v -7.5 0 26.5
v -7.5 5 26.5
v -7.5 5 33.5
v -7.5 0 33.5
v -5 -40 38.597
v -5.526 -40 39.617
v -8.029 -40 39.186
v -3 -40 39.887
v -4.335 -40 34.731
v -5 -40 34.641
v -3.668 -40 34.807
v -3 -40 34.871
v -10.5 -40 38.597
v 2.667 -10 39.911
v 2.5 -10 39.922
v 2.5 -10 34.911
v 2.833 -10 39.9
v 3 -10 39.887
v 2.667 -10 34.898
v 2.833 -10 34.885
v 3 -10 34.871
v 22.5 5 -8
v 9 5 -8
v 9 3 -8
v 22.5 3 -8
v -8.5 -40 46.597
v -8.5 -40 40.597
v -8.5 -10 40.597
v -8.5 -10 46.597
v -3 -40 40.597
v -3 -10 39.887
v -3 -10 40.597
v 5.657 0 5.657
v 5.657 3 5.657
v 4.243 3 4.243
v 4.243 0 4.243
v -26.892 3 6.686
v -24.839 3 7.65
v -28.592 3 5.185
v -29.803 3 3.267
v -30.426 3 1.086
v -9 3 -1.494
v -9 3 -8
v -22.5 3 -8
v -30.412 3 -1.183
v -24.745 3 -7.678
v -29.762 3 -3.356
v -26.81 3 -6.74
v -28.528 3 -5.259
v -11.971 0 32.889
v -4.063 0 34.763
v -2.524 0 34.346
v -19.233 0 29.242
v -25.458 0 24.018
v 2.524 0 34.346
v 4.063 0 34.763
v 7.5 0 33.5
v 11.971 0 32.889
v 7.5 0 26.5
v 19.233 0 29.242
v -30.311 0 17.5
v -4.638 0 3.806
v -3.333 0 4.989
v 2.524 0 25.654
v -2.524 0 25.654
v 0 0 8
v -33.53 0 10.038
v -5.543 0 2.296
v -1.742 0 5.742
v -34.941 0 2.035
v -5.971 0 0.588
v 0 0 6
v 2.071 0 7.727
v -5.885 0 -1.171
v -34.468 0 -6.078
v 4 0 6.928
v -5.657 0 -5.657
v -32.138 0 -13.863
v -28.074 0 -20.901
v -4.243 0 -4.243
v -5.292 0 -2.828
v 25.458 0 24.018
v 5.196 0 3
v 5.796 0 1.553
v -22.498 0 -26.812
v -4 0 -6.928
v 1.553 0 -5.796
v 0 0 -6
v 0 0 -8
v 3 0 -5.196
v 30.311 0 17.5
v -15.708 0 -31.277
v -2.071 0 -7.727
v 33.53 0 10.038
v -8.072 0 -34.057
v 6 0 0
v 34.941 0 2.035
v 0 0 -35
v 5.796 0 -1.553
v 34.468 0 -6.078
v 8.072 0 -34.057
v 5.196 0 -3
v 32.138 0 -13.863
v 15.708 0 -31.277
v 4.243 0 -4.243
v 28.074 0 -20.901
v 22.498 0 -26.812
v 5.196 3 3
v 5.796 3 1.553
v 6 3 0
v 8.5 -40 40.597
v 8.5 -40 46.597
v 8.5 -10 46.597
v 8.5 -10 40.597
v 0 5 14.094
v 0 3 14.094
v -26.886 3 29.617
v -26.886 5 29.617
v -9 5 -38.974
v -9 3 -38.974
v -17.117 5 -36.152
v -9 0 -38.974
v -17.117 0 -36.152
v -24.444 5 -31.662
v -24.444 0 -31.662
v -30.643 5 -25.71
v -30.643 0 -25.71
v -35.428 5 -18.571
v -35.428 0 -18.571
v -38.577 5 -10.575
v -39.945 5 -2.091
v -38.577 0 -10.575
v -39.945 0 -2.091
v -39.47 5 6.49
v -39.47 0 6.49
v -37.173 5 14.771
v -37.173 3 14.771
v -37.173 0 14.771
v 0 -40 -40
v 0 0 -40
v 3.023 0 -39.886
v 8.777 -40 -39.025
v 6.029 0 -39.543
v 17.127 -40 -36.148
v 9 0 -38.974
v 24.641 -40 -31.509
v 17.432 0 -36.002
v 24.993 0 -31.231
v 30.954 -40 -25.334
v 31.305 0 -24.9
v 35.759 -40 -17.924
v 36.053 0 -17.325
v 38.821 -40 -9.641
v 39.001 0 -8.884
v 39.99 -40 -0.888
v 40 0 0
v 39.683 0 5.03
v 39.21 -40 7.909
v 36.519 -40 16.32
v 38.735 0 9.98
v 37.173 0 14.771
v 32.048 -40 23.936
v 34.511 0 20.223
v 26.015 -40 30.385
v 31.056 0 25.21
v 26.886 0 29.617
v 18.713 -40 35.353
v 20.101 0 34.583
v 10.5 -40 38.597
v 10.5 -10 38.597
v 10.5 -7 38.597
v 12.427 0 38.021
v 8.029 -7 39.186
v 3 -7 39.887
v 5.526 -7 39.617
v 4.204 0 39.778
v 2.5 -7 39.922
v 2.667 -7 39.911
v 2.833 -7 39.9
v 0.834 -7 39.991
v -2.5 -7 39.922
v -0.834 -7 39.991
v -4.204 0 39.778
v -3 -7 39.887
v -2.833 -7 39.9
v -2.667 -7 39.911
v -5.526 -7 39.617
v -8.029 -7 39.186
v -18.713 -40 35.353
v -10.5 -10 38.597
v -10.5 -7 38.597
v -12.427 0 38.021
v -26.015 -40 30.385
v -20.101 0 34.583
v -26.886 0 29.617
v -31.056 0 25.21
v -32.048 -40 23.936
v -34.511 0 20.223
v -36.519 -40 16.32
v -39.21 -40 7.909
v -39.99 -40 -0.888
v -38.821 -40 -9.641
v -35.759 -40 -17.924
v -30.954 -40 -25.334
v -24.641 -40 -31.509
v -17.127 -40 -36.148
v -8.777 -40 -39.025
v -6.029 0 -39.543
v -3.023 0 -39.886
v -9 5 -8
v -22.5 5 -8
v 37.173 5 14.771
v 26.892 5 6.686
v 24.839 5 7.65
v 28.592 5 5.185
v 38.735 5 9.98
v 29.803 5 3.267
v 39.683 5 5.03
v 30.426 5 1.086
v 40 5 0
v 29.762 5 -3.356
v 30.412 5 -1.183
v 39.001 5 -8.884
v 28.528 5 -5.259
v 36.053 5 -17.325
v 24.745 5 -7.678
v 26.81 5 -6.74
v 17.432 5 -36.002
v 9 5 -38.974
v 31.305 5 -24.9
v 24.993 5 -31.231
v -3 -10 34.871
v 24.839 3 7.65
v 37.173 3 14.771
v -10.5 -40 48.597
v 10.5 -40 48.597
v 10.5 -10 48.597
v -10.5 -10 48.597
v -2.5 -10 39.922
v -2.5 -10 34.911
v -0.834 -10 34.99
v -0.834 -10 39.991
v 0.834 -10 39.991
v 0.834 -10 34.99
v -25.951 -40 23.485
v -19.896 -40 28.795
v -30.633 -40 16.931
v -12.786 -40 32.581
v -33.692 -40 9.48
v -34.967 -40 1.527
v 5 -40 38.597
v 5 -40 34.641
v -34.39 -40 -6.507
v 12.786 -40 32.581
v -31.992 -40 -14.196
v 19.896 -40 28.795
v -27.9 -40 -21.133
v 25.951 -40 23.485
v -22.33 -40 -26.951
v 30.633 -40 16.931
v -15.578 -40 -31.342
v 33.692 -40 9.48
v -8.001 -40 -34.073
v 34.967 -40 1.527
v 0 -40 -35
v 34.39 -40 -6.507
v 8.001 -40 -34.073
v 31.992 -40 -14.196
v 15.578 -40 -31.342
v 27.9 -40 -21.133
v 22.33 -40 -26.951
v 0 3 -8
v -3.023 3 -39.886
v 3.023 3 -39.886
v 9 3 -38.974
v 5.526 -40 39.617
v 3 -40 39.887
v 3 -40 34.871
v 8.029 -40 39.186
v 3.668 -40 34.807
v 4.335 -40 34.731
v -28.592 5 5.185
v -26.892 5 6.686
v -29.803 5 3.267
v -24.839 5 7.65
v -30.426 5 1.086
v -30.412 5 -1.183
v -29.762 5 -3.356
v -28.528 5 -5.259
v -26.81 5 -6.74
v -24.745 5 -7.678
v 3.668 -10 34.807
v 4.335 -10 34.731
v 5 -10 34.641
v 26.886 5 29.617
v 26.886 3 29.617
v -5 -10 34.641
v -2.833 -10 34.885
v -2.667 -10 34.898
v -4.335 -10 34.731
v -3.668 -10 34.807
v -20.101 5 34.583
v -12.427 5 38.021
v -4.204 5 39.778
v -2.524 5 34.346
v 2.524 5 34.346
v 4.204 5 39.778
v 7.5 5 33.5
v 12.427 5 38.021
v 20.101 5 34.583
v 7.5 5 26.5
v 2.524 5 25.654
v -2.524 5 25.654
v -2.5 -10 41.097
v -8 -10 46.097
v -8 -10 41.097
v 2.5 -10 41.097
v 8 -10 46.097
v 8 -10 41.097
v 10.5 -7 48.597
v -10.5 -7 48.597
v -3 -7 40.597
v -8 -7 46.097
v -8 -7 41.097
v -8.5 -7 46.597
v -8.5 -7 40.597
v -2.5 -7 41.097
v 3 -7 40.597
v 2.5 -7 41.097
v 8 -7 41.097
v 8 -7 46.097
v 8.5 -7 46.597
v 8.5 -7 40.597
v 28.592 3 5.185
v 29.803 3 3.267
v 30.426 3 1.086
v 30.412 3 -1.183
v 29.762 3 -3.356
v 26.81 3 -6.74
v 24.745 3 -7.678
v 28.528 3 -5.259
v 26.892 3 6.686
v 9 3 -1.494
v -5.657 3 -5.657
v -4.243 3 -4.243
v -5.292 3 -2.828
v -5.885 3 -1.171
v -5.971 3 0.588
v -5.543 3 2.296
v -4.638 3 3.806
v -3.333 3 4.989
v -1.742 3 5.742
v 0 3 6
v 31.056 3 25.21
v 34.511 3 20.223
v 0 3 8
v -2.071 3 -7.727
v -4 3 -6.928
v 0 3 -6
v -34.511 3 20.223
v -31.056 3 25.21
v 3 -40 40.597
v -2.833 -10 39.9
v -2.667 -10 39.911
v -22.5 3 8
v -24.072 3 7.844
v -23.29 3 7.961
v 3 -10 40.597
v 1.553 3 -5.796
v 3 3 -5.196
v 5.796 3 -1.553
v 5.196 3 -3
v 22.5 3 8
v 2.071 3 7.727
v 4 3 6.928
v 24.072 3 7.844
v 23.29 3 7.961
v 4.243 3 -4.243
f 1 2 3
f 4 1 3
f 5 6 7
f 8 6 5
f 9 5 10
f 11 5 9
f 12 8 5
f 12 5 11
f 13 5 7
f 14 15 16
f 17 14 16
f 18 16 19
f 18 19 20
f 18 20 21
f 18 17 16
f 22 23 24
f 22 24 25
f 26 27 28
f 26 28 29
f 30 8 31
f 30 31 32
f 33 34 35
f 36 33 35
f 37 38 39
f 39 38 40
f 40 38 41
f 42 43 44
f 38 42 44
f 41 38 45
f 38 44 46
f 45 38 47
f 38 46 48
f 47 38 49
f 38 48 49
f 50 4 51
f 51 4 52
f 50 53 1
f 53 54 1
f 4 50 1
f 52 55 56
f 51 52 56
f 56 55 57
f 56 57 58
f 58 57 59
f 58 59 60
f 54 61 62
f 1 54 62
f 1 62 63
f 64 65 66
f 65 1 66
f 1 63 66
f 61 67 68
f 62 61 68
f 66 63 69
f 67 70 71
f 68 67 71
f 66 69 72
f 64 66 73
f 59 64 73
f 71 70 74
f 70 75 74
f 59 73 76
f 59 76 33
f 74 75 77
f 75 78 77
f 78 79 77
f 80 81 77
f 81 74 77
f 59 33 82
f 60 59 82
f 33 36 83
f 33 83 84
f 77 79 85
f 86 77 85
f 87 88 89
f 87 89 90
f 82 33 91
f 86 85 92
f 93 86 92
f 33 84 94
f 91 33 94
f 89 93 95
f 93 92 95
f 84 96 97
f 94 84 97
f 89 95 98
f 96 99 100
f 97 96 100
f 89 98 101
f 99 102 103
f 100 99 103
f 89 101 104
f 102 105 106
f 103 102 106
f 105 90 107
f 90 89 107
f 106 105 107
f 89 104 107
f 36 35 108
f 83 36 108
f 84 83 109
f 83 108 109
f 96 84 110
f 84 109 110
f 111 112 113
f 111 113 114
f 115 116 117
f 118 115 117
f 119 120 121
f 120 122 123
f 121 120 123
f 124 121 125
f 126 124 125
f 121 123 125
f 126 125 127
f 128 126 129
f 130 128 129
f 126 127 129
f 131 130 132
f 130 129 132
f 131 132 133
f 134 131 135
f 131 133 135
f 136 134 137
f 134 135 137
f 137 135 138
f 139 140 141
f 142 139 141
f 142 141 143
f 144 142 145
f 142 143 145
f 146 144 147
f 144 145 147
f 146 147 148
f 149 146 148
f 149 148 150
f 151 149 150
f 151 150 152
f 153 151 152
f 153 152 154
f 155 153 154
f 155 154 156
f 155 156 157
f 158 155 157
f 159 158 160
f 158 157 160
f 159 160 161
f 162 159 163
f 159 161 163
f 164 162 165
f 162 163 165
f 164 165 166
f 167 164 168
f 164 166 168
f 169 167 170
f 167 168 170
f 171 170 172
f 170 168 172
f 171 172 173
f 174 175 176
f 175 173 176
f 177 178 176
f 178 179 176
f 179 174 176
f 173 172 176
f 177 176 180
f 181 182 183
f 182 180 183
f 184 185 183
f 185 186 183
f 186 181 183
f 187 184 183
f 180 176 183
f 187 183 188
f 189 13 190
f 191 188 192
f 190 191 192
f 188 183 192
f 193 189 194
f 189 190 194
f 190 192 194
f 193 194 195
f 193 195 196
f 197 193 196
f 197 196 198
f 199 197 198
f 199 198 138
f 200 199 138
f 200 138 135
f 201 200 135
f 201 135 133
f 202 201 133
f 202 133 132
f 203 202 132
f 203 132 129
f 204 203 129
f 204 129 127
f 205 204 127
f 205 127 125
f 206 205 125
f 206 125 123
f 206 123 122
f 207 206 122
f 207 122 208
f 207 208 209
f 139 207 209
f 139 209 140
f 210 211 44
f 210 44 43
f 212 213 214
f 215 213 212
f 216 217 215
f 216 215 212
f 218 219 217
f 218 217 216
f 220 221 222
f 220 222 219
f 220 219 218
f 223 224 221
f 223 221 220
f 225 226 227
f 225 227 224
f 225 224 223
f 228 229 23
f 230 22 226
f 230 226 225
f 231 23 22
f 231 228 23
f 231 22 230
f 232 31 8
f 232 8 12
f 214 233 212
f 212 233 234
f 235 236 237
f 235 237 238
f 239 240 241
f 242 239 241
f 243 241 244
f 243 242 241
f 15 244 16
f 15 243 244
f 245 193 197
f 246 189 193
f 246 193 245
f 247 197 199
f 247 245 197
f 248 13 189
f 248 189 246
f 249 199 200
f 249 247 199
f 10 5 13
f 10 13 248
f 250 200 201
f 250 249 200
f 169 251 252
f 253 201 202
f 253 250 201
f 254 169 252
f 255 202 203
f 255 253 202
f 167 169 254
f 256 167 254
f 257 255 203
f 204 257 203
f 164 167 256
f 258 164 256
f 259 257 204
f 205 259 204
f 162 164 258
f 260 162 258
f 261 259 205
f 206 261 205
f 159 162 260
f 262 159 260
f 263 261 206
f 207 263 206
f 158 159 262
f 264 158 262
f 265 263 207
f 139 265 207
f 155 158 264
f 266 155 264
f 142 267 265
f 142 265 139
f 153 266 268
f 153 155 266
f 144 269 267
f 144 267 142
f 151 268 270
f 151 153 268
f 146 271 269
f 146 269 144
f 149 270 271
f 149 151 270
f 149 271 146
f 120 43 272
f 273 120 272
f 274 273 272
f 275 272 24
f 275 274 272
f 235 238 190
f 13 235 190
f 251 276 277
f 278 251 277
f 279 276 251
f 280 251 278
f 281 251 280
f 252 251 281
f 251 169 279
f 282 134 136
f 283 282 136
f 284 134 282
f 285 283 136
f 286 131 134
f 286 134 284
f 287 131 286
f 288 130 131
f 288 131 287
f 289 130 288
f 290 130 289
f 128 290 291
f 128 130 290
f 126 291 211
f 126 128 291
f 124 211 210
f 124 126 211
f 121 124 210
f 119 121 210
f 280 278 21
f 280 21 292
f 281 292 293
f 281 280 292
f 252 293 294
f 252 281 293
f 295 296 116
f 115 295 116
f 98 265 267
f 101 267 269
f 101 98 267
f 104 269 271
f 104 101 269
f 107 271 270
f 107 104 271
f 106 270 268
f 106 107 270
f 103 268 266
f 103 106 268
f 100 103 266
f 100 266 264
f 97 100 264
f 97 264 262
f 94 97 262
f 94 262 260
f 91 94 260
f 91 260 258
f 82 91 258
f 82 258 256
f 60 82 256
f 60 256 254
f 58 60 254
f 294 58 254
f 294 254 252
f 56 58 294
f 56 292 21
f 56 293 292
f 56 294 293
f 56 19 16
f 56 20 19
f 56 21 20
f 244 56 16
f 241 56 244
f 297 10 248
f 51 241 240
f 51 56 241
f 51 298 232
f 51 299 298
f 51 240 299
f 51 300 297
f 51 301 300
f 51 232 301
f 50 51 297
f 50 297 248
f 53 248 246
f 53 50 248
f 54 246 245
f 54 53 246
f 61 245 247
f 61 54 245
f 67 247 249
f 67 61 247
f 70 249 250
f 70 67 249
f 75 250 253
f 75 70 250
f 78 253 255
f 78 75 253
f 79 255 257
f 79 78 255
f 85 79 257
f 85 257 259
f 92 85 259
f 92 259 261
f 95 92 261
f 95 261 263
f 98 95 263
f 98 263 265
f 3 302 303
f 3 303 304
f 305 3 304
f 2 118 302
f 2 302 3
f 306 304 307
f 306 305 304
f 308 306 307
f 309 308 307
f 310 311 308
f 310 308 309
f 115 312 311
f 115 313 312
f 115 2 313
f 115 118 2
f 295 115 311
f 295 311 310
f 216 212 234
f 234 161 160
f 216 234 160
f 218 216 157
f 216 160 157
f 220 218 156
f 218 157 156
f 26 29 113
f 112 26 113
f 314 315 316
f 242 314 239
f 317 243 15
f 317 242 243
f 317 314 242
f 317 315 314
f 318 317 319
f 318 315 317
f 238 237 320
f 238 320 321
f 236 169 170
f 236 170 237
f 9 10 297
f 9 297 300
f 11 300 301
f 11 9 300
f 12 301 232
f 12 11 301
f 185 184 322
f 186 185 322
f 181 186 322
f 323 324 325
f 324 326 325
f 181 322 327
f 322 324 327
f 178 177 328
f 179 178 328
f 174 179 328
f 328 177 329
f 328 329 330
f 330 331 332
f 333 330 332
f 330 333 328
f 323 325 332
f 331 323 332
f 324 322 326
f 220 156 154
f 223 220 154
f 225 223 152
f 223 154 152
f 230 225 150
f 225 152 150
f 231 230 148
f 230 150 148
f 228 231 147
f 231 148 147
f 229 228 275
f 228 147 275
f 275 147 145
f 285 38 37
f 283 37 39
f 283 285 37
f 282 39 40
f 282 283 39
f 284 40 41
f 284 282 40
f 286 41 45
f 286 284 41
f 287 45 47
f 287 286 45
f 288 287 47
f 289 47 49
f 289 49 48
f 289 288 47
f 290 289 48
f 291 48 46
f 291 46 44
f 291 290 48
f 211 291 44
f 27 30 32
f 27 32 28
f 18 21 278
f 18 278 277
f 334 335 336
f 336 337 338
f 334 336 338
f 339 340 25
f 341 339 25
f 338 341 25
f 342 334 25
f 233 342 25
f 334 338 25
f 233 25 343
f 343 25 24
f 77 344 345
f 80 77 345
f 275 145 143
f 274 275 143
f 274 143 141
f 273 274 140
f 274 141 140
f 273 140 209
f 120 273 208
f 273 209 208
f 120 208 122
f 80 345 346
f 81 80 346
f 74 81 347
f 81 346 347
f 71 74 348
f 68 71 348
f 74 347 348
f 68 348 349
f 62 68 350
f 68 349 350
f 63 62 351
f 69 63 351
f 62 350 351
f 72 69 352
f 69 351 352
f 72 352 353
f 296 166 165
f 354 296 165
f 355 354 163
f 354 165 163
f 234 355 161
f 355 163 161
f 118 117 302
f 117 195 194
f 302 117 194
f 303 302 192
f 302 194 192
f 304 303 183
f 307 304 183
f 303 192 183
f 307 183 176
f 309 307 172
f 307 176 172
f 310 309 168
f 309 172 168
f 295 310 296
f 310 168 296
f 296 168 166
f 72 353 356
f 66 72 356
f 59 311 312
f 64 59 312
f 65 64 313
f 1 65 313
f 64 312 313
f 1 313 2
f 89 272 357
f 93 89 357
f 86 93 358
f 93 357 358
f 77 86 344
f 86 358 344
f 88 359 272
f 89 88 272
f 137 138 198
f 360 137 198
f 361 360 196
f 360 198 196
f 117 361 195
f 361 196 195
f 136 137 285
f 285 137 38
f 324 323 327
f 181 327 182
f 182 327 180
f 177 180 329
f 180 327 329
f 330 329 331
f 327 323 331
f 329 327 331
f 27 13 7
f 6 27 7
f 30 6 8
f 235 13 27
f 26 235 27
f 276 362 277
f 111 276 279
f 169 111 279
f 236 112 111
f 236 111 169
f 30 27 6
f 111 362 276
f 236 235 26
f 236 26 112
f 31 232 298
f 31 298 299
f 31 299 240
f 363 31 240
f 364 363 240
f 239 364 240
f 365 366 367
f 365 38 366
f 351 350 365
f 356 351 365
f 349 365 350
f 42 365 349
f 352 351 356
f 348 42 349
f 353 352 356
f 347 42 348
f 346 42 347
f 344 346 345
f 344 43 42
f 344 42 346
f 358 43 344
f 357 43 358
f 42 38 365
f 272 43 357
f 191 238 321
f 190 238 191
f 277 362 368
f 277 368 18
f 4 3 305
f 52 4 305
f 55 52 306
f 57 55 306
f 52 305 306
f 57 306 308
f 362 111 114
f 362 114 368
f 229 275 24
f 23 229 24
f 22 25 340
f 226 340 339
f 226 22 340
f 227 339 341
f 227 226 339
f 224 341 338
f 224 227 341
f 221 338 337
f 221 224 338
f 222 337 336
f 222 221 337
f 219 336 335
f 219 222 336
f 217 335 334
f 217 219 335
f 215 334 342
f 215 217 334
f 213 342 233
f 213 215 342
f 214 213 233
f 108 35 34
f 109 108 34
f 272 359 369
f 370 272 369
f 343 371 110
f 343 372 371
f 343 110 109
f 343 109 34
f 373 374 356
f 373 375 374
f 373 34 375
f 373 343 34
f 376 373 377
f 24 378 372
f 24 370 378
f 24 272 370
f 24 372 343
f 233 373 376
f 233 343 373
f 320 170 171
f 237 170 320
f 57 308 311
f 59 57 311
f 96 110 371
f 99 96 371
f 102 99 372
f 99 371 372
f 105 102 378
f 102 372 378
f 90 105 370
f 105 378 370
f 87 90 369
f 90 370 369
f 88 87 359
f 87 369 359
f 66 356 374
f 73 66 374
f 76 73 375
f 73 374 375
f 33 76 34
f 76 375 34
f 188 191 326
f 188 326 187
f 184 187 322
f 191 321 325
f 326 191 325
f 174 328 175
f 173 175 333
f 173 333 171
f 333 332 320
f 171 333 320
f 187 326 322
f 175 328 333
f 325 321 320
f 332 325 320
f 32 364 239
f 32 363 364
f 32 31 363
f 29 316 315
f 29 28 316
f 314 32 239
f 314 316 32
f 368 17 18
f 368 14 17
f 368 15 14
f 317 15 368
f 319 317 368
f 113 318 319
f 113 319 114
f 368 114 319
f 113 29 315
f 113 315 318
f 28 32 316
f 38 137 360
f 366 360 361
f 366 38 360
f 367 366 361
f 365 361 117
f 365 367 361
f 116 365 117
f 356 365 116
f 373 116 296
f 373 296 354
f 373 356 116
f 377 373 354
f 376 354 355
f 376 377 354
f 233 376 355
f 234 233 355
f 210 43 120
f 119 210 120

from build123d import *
from build123d.topology import SkipClean

# Parameters (mm, degrees)
BOSS_EXTRUDE1_DEPTH     = 5
BOSS_EXTRUDE1_2_DEPTH   = 5
BOSS_EXTRUDE1_3_DEPTH   = 5
BOSS_EXTRUDE2_DEPTH     = 3
SKETCH2_R               = 40
SKETCH2_R_2             = 35
BOSS_EXTRUDE3_DEPTH     = 40
CUT_EXTRUDE1_DEPTH      = 1
CUT_EXTRUDE1_DEPTH_BACK = 46
SKETCH5_R               = 6
CUT_EXTRUDE4_DEPTH      = 3
CUT_EXTRUDE4_DEPTH_BACK = 44
CUT_EXTRUDE6_DEPTH      = 2
BOSS_EXTRUDE6_DEPTH     = 30
CUT_EXTRUDE7_DEPTH      = 30
BOSS_EXTRUDE7_START     = -30
BOSS_EXTRUDE7_DEPTH     = 3


with BuildPart() as part:
    # Sketch1 → Boss-Extrude1 (new body)
    with BuildSketch(Plane(origin=(0, 0, 0), x_dir=(1, 0, 0), z_dir=(0, 1, 0))):
        with BuildLine():
            ThreePointArc((-26.885901745, -29.616689338), (0, -40), (26.885901745, -29.616689338))
            Line((26.885901745, -29.616689338), (0, -14.094106728))
            Line((0, -14.094106728), (-26.885901745, -29.616689338))
        make_face()
    extrude(amount=BOSS_EXTRUDE1_DEPTH)



with BuildPart() as body_2:
    # Sketch1 → Boss-Extrude1 2 (new body)
    with BuildSketch(Plane(origin=(0, 0, 0), x_dir=(1, 0, 0), z_dir=(0, 1, 0))):
        with BuildLine():
            ThreePointArc((-9, 38.97435054), (-35.427756972, 18.570784472), (-37.172733345, -14.771184641))
            Line((-37.172733345, -14.771184641), (-9, 1.49435054))
            Line((-9, 1.49435054), (-9, 38.97435054))
        make_face()
    extrude(amount=BOSS_EXTRUDE1_2_DEPTH)


with BuildPart() as body_3:
    # Sketch1 → Boss-Extrude1 3 (new body)
    with BuildSketch(Plane(origin=(0, 0, 0), x_dir=(1, 0, 0), z_dir=(0, 1, 0))):
        with BuildLine():
            Line((9, 1.49435054), (37.172733345, -14.771184641))
            ThreePointArc((37.172733345, -14.771184641), (39.286825615, -7.519663098), (40, 0))
            ThreePointArc((40, 0), (31.304951685, 24.899799196), (9, 38.97435054))
            Line((9, 38.97435054), (9, 1.49435054))
        make_face()
    extrude(amount=BOSS_EXTRUDE1_3_DEPTH)


with BuildPart() as part_1:
    add(part.part)

    add(body_2.part)  # Boss-Extrude2 merges body 2

    add(body_3.part)  # Boss-Extrude2 merges body 3
    # Sketch1_3 → Boss-Extrude2 (add)
    with BuildSketch(Plane(origin=(0, 0, 0), x_dir=(1, 0, 0), z_dir=(0, 1, 0))):
        with BuildLine():
            Line((0, -14.094106728), (26.885901745, -29.616689338))
            ThreePointArc((26.885901745, -29.616689338), (32.878175661, -22.782132586), (37.172733345, -14.771184641))
            Line((37.172733345, -14.771184641), (9, 1.49435054))
            Line((9, 1.49435054), (9, 38.97435054))
            ThreePointArc((9, 38.97435054), (0, 40), (-9, 38.97435054))
            Line((-9, 38.97435054), (-9, 1.49435054))
            Line((-9, 1.49435054), (-37.172733345, -14.771184641))
            ThreePointArc((-37.172733345, -14.771184641), (-32.878175661, -22.782132586), (-26.885901745, -29.616689338))
            Line((-26.885901745, -29.616689338), (0, -14.094106728))
        make_face()
    extrude(amount=BOSS_EXTRUDE2_DEPTH)

    # Sketch2 → Boss-Extrude3 (add)
    with SkipClean():  # keep this step's faces unmerged: merging them makes the solid invalid here
        with BuildSketch(Plane.XZ):
            with Locations(Location((0, 0, 0), (0, 0, 270))):  # turned: the seam where the file's is
                Circle(SKETCH2_R)
            with Locations(Location((0, 0, 0), (0, 0, 270))):  # turned: the seam where the file's is
                Circle(SKETCH2_R_2, mode=Mode.SUBTRACT)
        extrude(amount=BOSS_EXTRUDE3_DEPTH)

    # Sketch3 → Cut-Extrude1 (cut, two sides)
    with SkipClean():  # keep this step's faces unmerged: merging them makes the solid invalid here
        with BuildSketch(Plane(origin=(0, 5, 0), x_dir=(1, 0, 0), z_dir=(0, 1, 0))) as cut_extrude1_sk:
            with BuildLine():
                Line((-7.5, -26.5), (-7.5, -33.5))
                ThreePointArc((-7.5, -33.5), (0, -34.452624903), (7.5, -33.5))
                Line((7.5, -33.5), (7.5, -26.5))
                ThreePointArc((7.5, -26.5), (0, -25.547375097), (-7.5, -26.5))
            make_face()
        extrude(amount=CUT_EXTRUDE1_DEPTH, mode=Mode.SUBTRACT)
        extrude(cut_extrude1_sk.sketch, amount=-CUT_EXTRUDE1_DEPTH_BACK, mode=Mode.SUBTRACT)

    # Sketch5 → Cut-Extrude4 (cut, two sides)
    with SkipClean():  # keep this step's faces unmerged: merging them makes the solid invalid here
        with BuildSketch(Plane(origin=(0, 3, 0), x_dir=(1, 0, 0), z_dir=(0, 1, 0))) as cut_extrude4_sk:
            Circle(SKETCH5_R)
            with BuildLine():
                ThreePointArc((-4.242640687, 4.242640687), (-2.296100594, 5.543277195), (0, 6))
                Line((0, 6), (0, 8))
                ThreePointArc((0, 8), (-3.061467459, 7.39103626), (-5.656854249, 5.656854249))
                Line((-5.656854249, 5.656854249), (-4.242640687, 4.242640687))
            make_face()
            with BuildLine():
                Line((5.656854249, -5.656854249), (4.242640687, -4.242640687))
                ThreePointArc((4.242640687, -4.242640687), (2.296100594, -5.543277195), (0, -6))
                Line((0, -6), (0, -8))
                ThreePointArc((0, -8), (3.061467459, -7.39103626), (5.656854249, -5.656854249))
            make_face()
        extrude(amount=CUT_EXTRUDE4_DEPTH, mode=Mode.SUBTRACT)
        extrude(cut_extrude4_sk.sketch, amount=-CUT_EXTRUDE4_DEPTH_BACK, mode=Mode.SUBTRACT)

    # Sketch17 → Cut-Extrude6 (cut)
    with SkipClean():  # keep this step's faces unmerged: merging them makes the solid invalid here
        with BuildSketch(Plane(origin=(0, 5, 0), x_dir=(1, 0, 0), z_dir=(0, 1, 0))):
            with BuildLine():
                Line((-22.5, 8), (22.5, 8))
                ThreePointArc((22.5, 8), (30.5, 0), (22.5, -8))
                Line((22.5, -8), (-22.5, -8))
                ThreePointArc((-22.5, -8), (-30.5, 0), (-22.5, 8))
            make_face()
        extrude(amount=-CUT_EXTRUDE6_DEPTH, mode=Mode.SUBTRACT)

    # Sketch19 → Boss-Extrude6 (add)
    with SkipClean():  # keep this step's faces unmerged: merging them makes the solid invalid here
        with BuildSketch(Plane.XZ.offset(40)):
            with BuildLine():
                Line((-10.5, 48.597279697), (-10.5, 38.597279697))
                ThreePointArc((-10.5, 38.597279697), (-6.780749573, 39.421078565), (-3, 39.88734135))
                Line((-3, 39.88734135), (-3, 40.597279697))
                Line((-3, 40.597279697), (-8.5, 40.597279697))
                Line((-8.5, 40.597279697), (-8.5, 46.597279697))
                Line((-8.5, 46.597279697), (8.5, 46.597279697))
                Line((8.5, 46.597279697), (8.5, 40.597279697))
                Line((8.5, 40.597279697), (3, 40.597279697))
                Line((3, 40.597279697), (3, 39.88734135))
                ThreePointArc((3, 39.88734135), (6.780749573, 39.421078565), (10.5, 38.597279697))
                Line((10.5, 38.597279697), (10.5, 48.597279697))
                Line((10.5, 48.597279697), (-10.5, 48.597279697))
            make_face()
            with BuildLine():
                ThreePointArc((-3, 39.88734135), (-6.780749573, 39.421078565), (-10.5, 38.597279697))
                Line((-10.5, 38.597279697), (-5, 38.597279697))
                Line((-5, 38.597279697), (-5, 34.641016151))
                ThreePointArc((-5, 34.641016151), (-4.001655305, 34.770486836), (-3, 34.871191548))
                Line((-3, 34.871191548), (-3, 39.88734135))
            make_face()
            with BuildLine():
                Line((5, 38.597279697), (10.5, 38.597279697))
                ThreePointArc((10.5, 38.597279697), (6.780749573, 39.421078565), (3, 39.88734135))
                Line((3, 39.88734135), (3, 34.871191548))
                ThreePointArc((3, 34.871191548), (4.001655305, 34.770486836), (5, 34.641016151))
                Line((5, 34.641016151), (5, 38.597279697))
            make_face()
        extrude(amount=-BOSS_EXTRUDE6_DEPTH)

    # Sketch19_3 → Cut-Extrude7 (cut)
    with SkipClean():  # keep this step's faces unmerged: merging them makes the solid invalid here
        with BuildSketch(Plane.XZ.offset(40)):
            with BuildLine():
                ThreePointArc((2.5, 39.921798557), (0, 40), (-2.5, 39.921798557))
                Line((-2.5, 39.921798557), (-2.5, 34.910600109))
                ThreePointArc((-2.5, 34.910600109), (0, 35), (2.5, 34.910600109))
                Line((2.5, 34.910600109), (2.5, 39.921798557))
            make_face()
            with BuildLine():
                ThreePointArc((-2.5, 39.921798557), (-2.750053968, 39.905353064), (-3, 39.88734135))
                Line((-3, 39.88734135), (-3, 34.871191548))
                ThreePointArc((-3, 34.871191548), (-2.750070592, 34.891791466), (-2.5, 34.910600109))
                Line((-2.5, 34.910600109), (-2.5, 39.921798557))
            make_face()
            with BuildLine():
                ThreePointArc((3, 39.88734135), (2.750053968, 39.905353064), (2.5, 39.921798557))
                Line((2.5, 39.921798557), (2.5, 34.910600109))
                ThreePointArc((2.5, 34.910600109), (2.750070592, 34.891791466), (3, 34.871191548))
                Line((3, 34.871191548), (3, 39.88734135))
            make_face()
        extrude(amount=-CUT_EXTRUDE7_DEPTH, mode=Mode.SUBTRACT)

    # Sketch19_4 → Boss-Extrude7 (add)
    with SkipClean():  # keep this step's faces unmerged: merging them makes the solid invalid here
        with BuildSketch(Plane.XZ.offset(40).offset(BOSS_EXTRUDE7_START)):
            with BuildLine():
                Line((-10.5, 48.597279697), (-10.5, 38.597279697))
                ThreePointArc((-10.5, 38.597279697), (-6.780749573, 39.421078565), (-3, 39.88734135))
                Line((-3, 39.88734135), (-3, 40.597279697))
                Line((-3, 40.597279697), (-8.5, 40.597279697))
                Line((-8.5, 40.597279697), (-8.5, 46.597279697))
                Line((-8.5, 46.597279697), (8.5, 46.597279697))
                Line((8.5, 46.597279697), (8.5, 40.597279697))
                Line((8.5, 40.597279697), (3, 40.597279697))
                Line((3, 40.597279697), (3, 39.88734135))
                ThreePointArc((3, 39.88734135), (6.780749573, 39.421078565), (10.5, 38.597279697))
                Line((10.5, 38.597279697), (10.5, 48.597279697))
                Line((10.5, 48.597279697), (-10.5, 48.597279697))
            make_face()
            with BuildLine():
                Line((-3, 40.597279697), (-3, 39.88734135))
                ThreePointArc((-3, 39.88734135), (-2.750053968, 39.905353064), (-2.5, 39.921798557))
                Line((-2.5, 39.921798557), (-2.5, 41.097279697))
                Line((-2.5, 41.097279697), (-8, 41.097279697))
                Line((-8, 41.097279697), (-8, 46.097279697))
                Line((-8, 46.097279697), (8, 46.097279697))
                Line((8, 46.097279697), (8, 41.097279697))
                Line((8, 41.097279697), (2.5, 41.097279697))
                Line((2.5, 41.097279697), (2.5, 39.921798557))
                ThreePointArc((2.5, 39.921798557), (2.750053968, 39.905353064), (3, 39.88734135))
                Line((3, 39.88734135), (3, 40.597279697))
                Line((3, 40.597279697), (8.5, 40.597279697))
                Line((8.5, 40.597279697), (8.5, 46.597279697))
                Line((8.5, 46.597279697), (-8.5, 46.597279697))
                Line((-8.5, 46.597279697), (-8.5, 40.597279697))
                Line((-8.5, 40.597279697), (-3, 40.597279697))
            make_face()
            with BuildLine():
                Line((-2.5, 41.097279697), (-2.5, 39.921798557))
                ThreePointArc((-2.5, 39.921798557), (0, 40), (2.5, 39.921798557))
                Line((2.5, 39.921798557), (2.5, 41.097279697))
                Line((2.5, 41.097279697), (8, 41.097279697))
                Line((8, 41.097279697), (8, 46.097279697))
                Line((8, 46.097279697), (-8, 46.097279697))
                Line((-8, 46.097279697), (-8, 41.097279697))
                Line((-8, 41.097279697), (-2.5, 41.097279697))
            make_face()
        extrude(amount=-BOSS_EXTRUDE7_DEPTH)


solid = part_1.part
